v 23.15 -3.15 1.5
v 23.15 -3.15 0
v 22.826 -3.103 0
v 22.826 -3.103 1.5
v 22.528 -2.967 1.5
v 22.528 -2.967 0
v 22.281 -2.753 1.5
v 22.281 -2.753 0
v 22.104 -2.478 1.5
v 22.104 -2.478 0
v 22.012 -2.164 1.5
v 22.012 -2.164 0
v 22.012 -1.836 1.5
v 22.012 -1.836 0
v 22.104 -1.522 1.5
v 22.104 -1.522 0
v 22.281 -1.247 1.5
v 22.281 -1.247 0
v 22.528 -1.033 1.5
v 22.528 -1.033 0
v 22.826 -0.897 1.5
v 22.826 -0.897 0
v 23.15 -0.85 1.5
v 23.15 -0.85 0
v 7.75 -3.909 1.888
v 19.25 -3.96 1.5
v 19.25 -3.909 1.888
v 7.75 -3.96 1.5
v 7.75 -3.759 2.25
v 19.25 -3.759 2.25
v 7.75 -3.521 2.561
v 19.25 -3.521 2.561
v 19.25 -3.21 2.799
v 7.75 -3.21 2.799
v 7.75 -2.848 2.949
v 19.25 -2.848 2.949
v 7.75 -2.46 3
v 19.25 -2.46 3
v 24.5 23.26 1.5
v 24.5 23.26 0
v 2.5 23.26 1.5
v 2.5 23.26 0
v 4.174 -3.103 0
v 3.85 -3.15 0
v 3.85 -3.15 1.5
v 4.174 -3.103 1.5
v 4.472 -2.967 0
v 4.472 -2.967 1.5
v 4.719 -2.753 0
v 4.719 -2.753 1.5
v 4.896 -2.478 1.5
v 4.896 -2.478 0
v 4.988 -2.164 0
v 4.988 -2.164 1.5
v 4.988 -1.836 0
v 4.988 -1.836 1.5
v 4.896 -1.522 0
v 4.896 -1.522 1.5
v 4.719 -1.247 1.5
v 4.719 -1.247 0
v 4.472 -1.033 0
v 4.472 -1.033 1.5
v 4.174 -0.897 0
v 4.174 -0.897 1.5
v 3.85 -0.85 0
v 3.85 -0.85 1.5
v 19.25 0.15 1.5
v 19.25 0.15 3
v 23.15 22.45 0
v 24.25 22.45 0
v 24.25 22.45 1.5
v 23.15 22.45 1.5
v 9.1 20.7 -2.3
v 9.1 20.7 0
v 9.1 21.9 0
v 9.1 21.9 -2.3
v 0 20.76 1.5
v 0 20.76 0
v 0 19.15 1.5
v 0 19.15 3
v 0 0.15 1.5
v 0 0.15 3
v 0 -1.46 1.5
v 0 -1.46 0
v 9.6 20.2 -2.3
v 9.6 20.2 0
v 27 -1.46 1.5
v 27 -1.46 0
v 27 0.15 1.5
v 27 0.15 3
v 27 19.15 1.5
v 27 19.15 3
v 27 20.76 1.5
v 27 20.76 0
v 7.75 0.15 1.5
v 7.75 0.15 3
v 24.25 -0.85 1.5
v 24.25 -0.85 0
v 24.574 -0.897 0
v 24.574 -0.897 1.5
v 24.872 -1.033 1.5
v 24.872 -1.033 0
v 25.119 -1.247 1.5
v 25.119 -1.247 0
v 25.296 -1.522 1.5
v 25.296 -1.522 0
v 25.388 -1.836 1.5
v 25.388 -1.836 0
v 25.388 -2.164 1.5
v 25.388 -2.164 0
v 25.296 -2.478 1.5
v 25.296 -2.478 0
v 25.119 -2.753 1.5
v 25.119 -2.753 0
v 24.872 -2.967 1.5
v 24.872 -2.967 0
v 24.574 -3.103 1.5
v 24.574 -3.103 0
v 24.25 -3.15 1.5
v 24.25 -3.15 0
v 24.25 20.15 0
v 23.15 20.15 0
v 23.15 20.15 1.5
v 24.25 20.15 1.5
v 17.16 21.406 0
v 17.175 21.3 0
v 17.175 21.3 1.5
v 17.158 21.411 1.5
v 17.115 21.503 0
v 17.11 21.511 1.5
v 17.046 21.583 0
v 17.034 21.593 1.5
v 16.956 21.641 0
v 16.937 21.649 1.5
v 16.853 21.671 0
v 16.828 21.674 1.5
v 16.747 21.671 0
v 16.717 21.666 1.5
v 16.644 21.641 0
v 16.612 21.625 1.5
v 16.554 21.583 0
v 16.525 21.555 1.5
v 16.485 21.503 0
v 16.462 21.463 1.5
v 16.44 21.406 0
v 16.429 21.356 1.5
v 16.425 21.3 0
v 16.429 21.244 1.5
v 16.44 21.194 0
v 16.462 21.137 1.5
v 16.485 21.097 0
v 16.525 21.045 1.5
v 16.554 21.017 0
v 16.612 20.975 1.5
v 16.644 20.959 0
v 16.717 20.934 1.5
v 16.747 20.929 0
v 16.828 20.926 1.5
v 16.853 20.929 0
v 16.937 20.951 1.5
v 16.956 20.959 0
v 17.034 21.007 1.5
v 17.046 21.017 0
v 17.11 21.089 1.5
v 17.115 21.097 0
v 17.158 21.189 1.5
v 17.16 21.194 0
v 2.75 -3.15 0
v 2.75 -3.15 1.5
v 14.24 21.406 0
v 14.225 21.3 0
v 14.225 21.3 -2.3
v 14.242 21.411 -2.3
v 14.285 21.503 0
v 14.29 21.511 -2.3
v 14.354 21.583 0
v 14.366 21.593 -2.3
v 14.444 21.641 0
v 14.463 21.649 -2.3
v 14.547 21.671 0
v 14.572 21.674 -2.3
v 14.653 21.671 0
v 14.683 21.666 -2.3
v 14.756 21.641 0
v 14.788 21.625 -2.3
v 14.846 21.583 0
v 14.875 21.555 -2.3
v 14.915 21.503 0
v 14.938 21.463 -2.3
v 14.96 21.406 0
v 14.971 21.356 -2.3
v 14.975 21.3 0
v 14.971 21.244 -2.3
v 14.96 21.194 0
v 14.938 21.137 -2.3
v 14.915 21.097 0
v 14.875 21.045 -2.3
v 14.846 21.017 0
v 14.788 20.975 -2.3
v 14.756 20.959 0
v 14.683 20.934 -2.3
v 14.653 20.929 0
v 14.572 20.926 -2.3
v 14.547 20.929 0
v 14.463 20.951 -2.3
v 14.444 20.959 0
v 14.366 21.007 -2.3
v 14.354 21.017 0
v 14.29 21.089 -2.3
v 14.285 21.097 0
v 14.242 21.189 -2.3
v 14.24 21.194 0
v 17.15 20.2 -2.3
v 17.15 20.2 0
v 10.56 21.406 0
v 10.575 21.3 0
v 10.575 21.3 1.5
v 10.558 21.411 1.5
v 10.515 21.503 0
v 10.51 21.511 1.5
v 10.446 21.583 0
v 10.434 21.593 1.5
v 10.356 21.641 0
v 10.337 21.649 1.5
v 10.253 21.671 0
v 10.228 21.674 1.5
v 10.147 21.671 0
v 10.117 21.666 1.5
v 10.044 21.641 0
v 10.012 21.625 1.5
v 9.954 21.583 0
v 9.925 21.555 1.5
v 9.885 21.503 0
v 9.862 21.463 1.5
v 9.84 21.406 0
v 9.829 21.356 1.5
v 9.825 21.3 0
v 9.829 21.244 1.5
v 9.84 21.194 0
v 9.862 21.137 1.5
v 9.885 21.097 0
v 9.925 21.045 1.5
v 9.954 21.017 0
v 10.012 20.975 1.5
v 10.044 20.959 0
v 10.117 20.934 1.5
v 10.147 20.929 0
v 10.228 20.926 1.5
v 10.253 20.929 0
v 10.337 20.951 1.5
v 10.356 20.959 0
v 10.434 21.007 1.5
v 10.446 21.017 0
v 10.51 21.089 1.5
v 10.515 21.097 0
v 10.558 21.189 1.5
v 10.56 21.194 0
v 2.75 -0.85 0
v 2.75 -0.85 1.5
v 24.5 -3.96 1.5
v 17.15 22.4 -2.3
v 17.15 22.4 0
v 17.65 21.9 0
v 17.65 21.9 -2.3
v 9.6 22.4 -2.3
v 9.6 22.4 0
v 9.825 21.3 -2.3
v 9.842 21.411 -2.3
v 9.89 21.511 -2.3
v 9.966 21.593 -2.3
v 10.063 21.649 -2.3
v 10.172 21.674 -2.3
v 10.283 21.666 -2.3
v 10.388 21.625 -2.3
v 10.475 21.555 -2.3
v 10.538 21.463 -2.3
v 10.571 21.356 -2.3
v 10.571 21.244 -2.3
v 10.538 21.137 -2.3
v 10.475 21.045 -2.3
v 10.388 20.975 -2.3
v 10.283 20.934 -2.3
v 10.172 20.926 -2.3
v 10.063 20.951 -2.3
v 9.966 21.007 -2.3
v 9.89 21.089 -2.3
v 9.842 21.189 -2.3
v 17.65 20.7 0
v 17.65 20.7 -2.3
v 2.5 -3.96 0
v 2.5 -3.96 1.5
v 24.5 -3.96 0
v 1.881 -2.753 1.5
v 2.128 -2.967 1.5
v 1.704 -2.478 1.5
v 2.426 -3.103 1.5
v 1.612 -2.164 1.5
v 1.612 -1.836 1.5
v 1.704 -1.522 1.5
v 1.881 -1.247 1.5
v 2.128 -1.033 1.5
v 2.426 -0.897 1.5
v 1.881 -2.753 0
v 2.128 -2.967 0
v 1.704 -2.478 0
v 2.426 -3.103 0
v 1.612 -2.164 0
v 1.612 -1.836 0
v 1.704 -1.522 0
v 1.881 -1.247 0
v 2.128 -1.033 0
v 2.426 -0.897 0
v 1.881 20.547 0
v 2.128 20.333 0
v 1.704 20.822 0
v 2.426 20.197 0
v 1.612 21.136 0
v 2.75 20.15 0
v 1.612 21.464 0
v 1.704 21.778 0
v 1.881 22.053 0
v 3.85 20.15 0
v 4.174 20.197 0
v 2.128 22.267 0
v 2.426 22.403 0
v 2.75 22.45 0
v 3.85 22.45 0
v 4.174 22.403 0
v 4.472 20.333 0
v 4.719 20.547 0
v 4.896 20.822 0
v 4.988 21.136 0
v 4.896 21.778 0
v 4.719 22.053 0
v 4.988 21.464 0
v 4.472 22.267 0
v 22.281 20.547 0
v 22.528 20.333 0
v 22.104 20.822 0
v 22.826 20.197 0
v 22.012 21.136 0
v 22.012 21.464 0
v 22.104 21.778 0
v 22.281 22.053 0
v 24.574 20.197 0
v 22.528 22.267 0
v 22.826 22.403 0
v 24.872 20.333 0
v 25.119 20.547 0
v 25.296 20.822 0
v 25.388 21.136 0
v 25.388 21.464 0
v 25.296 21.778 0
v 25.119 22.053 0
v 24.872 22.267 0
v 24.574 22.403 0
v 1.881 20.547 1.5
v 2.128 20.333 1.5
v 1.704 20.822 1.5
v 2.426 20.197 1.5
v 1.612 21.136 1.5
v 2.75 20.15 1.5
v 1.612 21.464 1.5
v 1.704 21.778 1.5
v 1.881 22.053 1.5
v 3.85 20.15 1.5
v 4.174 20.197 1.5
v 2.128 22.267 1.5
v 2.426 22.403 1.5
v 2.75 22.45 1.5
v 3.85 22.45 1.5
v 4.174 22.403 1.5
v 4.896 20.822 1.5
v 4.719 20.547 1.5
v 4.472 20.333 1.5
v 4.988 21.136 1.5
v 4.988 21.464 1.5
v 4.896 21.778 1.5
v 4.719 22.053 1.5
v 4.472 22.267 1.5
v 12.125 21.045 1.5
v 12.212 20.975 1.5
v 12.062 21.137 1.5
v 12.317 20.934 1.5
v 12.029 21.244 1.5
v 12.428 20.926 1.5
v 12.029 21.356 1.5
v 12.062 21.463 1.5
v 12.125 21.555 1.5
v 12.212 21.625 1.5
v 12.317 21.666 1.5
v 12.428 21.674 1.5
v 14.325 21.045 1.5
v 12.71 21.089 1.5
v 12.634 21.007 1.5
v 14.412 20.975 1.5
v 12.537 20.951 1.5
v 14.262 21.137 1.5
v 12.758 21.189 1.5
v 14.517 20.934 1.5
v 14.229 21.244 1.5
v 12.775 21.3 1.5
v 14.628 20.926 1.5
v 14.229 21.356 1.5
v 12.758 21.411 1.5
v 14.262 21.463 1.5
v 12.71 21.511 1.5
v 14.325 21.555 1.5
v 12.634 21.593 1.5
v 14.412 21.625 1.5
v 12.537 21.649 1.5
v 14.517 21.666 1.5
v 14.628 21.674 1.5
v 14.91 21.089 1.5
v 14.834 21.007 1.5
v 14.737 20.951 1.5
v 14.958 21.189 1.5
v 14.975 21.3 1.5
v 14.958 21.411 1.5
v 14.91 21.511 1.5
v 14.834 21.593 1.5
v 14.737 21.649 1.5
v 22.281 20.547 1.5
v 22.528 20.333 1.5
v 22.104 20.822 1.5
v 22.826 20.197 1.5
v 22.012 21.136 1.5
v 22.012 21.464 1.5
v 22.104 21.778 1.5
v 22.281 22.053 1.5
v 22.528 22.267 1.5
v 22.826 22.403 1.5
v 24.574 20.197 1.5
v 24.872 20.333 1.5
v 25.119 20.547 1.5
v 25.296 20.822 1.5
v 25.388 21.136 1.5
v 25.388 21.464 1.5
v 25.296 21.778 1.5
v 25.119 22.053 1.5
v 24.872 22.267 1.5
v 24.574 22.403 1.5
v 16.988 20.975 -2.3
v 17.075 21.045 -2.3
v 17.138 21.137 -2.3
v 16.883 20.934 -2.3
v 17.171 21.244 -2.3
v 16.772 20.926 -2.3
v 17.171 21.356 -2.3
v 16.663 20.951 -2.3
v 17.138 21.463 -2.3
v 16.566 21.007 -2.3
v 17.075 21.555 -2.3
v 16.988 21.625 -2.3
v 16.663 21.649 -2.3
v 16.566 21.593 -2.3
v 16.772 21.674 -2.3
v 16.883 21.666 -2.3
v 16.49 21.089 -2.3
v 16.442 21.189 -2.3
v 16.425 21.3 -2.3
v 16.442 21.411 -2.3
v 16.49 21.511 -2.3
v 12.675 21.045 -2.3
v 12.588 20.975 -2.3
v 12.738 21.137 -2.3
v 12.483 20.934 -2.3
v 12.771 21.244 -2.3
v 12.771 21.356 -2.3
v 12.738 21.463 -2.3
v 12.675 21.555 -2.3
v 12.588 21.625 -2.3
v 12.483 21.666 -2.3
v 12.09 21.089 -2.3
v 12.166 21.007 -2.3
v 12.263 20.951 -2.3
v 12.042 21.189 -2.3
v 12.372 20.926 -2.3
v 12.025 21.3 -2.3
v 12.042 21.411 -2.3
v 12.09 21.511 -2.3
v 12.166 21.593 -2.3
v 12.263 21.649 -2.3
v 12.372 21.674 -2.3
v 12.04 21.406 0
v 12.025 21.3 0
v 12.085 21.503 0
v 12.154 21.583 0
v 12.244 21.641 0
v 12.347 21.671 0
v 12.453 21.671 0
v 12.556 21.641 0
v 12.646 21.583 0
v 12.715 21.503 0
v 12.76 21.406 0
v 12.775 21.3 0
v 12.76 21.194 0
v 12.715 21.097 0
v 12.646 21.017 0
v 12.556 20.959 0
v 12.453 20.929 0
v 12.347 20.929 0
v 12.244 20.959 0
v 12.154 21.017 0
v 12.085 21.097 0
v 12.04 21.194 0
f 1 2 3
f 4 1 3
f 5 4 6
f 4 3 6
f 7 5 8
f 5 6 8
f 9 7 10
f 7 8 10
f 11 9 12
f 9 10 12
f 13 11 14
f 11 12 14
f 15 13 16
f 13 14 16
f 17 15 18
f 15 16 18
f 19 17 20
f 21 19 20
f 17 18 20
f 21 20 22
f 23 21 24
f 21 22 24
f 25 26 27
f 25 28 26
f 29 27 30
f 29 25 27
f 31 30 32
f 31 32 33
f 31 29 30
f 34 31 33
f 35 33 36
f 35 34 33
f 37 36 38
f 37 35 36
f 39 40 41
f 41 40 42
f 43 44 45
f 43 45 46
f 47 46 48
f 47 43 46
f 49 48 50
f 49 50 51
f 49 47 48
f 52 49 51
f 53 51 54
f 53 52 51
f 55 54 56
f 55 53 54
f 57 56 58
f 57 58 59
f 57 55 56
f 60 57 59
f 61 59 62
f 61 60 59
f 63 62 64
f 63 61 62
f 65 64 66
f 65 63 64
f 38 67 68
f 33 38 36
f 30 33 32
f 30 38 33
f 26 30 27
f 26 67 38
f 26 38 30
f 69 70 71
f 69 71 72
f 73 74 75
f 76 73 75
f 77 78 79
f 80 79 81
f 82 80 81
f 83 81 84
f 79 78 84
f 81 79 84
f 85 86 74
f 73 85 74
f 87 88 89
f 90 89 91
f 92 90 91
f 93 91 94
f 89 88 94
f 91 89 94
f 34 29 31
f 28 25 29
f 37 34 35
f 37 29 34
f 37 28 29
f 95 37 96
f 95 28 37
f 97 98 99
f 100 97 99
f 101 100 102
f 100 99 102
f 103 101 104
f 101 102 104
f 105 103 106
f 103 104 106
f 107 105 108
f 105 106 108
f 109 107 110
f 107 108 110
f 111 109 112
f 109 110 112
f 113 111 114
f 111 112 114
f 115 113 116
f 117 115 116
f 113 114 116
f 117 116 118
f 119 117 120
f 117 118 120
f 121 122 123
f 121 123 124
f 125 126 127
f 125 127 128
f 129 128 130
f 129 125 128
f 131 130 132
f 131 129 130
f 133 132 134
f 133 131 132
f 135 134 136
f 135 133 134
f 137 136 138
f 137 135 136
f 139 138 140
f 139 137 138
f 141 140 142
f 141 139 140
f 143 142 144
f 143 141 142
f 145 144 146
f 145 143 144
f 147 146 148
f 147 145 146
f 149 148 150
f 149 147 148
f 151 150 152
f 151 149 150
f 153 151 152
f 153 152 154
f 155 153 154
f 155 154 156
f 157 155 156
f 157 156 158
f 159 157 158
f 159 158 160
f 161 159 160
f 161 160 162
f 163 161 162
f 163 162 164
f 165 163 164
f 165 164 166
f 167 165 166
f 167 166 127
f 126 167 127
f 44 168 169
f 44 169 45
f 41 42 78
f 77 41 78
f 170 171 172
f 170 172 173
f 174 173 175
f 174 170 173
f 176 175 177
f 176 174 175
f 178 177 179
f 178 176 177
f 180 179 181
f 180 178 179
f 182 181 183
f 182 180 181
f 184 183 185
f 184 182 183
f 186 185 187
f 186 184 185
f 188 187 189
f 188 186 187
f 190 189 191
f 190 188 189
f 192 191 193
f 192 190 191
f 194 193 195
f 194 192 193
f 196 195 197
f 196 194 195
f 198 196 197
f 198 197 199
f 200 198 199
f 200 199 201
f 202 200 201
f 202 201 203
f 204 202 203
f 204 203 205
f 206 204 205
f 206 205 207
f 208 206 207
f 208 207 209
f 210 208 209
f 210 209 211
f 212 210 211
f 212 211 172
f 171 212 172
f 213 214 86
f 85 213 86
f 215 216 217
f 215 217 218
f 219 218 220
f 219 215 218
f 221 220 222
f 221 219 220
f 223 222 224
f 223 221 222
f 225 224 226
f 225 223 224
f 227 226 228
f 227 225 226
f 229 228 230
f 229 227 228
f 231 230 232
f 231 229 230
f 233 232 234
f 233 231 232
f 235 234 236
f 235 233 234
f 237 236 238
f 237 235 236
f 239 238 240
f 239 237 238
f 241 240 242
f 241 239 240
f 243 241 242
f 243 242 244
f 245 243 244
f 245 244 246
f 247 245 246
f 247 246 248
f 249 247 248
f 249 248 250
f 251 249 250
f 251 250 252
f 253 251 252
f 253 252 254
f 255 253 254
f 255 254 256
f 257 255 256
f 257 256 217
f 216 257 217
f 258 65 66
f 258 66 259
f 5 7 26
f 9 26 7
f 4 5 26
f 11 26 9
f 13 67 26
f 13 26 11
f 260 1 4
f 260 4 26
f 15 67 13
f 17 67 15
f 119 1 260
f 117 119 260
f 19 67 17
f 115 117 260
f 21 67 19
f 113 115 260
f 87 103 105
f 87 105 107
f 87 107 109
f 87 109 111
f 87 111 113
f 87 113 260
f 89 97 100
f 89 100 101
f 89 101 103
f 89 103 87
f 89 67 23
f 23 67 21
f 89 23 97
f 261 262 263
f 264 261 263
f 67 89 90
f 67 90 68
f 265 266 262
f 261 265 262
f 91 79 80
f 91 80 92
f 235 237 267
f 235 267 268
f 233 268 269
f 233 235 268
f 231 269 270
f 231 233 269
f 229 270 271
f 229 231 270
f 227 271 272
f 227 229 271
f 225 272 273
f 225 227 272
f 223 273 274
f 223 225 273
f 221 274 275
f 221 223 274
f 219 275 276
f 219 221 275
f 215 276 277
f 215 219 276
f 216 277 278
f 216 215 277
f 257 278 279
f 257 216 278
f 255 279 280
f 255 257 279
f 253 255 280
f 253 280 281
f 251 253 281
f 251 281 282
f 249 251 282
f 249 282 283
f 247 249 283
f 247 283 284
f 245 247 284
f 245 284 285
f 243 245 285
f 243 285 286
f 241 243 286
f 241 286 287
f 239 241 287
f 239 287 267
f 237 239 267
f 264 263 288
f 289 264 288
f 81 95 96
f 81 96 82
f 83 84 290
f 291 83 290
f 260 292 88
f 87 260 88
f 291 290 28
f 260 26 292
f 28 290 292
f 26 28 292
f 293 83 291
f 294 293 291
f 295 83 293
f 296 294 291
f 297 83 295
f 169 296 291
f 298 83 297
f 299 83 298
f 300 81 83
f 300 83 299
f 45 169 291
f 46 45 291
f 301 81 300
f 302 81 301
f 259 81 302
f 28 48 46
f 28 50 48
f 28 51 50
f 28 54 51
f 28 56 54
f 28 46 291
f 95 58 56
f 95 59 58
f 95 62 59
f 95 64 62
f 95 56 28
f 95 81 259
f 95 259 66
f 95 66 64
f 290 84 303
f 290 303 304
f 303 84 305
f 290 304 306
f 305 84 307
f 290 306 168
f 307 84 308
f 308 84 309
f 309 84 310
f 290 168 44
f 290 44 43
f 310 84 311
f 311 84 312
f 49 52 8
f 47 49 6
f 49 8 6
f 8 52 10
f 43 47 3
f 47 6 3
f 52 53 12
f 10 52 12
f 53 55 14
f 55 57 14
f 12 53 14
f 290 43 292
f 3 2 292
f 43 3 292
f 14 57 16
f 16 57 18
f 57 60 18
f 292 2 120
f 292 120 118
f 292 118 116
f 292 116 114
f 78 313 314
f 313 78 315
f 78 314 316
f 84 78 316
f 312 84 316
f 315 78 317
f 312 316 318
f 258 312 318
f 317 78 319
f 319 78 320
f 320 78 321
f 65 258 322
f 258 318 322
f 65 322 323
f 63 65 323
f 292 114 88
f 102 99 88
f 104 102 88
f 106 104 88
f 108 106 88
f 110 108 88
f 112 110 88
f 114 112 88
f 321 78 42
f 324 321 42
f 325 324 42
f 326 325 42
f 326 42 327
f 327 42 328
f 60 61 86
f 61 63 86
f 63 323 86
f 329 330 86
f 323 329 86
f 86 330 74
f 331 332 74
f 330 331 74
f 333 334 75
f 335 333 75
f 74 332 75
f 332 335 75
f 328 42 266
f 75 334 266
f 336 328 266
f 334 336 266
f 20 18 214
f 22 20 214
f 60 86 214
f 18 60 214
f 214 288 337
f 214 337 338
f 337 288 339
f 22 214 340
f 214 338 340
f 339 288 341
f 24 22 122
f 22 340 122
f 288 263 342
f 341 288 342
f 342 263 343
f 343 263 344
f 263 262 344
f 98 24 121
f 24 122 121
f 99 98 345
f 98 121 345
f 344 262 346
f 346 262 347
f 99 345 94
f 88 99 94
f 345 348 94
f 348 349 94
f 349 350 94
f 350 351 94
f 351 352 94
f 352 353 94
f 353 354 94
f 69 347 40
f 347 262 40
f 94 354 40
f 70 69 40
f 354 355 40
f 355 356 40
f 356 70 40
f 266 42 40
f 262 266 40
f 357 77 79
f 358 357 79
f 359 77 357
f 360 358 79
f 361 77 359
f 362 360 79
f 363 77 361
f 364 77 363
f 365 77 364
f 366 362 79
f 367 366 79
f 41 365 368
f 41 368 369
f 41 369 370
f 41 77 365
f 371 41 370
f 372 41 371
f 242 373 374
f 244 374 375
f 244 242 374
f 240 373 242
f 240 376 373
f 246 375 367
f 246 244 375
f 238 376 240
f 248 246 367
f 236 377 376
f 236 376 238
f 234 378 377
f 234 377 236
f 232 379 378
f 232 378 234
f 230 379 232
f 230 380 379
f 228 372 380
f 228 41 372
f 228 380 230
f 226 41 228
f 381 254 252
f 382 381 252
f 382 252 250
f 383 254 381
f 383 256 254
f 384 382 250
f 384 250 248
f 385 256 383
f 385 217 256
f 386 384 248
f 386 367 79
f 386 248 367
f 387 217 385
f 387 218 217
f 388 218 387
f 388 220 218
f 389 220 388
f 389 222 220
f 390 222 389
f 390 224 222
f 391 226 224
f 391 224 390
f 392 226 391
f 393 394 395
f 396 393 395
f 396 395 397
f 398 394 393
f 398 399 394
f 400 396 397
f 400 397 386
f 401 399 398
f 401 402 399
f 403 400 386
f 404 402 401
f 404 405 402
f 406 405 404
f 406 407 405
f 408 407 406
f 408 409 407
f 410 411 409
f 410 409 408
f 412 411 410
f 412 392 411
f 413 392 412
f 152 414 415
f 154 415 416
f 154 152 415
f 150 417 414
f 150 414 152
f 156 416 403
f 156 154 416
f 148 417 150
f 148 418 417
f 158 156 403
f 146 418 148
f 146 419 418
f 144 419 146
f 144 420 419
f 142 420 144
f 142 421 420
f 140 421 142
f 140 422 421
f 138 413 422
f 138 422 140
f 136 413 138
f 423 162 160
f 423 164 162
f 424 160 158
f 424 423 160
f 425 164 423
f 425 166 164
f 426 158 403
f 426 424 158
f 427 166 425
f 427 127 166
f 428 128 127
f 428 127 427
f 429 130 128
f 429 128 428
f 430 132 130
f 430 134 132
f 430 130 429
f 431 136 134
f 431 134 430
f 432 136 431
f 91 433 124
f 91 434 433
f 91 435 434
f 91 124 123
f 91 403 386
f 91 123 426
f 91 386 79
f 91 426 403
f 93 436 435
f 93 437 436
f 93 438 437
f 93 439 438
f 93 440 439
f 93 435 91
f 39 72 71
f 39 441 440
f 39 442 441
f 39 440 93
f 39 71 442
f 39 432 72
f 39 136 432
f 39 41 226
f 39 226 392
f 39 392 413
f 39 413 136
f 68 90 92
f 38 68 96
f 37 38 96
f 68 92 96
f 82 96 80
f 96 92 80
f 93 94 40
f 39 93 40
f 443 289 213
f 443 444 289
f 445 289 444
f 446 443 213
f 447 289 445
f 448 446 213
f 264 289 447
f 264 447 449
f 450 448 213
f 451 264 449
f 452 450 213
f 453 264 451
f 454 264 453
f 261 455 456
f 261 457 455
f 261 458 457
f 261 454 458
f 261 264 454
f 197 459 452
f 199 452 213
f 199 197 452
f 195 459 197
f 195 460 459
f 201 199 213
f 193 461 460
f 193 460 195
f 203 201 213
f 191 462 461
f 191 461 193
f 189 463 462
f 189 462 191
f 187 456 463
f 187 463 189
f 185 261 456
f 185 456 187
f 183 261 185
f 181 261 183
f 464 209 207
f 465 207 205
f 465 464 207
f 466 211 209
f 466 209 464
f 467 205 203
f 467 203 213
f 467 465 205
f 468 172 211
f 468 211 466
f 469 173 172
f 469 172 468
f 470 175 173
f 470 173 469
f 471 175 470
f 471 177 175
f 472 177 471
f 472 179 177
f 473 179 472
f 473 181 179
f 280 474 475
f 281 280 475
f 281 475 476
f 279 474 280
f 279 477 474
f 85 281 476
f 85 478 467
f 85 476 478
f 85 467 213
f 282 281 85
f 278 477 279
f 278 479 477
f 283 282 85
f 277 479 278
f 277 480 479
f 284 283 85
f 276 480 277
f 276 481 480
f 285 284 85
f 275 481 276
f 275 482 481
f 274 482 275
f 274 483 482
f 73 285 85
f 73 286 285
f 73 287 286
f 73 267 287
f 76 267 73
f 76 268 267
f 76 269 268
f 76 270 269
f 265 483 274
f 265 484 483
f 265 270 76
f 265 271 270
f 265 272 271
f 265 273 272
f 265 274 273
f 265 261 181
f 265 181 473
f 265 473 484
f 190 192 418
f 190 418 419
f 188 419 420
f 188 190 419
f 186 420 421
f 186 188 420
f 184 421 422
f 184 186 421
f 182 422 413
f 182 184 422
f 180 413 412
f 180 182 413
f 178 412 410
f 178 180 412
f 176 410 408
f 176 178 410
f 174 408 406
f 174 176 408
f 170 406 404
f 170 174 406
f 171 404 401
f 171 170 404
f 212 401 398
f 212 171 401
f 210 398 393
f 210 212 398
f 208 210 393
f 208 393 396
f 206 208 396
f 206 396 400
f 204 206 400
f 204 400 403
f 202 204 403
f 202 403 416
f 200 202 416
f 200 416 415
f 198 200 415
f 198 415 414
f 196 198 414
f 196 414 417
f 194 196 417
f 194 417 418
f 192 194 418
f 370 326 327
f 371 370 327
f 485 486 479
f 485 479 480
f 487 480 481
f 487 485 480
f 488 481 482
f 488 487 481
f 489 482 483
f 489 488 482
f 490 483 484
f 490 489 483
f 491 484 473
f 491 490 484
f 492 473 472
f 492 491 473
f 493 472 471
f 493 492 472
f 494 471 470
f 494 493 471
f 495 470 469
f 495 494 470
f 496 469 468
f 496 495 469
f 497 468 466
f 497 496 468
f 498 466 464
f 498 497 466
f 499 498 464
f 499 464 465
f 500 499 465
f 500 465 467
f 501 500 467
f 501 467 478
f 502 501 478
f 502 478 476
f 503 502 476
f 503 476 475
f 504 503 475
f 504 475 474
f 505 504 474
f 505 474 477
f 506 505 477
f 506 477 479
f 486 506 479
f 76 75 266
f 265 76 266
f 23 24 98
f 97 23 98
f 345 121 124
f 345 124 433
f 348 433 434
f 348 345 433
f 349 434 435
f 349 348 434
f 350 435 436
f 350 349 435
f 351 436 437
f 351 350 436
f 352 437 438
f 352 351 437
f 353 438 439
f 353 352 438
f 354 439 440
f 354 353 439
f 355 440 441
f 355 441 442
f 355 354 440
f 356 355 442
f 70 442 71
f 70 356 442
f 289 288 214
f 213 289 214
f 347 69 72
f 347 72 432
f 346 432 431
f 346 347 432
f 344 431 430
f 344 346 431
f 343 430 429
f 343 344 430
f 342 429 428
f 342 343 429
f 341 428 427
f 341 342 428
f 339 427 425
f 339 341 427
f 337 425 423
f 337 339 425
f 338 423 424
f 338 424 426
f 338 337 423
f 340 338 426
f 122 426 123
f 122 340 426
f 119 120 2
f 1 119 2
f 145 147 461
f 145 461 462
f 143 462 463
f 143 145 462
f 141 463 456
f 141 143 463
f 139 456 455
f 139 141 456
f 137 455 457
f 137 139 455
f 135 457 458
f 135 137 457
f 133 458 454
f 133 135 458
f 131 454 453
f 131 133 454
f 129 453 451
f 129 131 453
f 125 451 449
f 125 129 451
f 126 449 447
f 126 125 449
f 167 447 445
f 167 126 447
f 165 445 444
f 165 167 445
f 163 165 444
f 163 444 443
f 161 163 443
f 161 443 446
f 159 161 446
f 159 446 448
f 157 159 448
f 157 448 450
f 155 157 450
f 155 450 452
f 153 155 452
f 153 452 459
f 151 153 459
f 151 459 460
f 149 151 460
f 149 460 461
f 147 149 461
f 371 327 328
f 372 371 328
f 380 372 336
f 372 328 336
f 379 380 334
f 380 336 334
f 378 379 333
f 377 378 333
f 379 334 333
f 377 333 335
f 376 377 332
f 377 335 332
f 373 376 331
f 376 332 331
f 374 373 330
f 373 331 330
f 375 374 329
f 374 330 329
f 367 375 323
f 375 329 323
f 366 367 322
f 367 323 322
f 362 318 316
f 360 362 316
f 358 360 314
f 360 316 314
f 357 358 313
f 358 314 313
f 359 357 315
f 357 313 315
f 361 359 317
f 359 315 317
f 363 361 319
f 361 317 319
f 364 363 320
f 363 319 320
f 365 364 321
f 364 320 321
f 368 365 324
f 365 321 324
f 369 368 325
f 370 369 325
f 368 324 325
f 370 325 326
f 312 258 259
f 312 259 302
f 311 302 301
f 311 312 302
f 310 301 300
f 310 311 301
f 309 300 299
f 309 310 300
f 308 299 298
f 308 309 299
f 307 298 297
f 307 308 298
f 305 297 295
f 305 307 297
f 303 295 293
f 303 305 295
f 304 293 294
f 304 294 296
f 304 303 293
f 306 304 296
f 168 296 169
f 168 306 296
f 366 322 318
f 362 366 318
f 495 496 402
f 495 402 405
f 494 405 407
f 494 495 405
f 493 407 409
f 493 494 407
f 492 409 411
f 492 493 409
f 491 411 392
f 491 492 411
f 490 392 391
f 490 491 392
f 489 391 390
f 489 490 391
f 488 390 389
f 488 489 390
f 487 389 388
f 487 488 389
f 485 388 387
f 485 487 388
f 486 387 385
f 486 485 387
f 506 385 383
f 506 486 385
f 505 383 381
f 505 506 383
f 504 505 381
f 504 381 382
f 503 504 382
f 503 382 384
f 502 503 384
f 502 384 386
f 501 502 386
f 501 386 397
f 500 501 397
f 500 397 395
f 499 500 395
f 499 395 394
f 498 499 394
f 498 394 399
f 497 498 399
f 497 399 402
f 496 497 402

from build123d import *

# Parameters (mm, degrees)
ESQUISSE1_R        = 0.375
BOSS_EXTRU_1_DEPTH = 1.5
BOSS_EXTRU_2_DEPTH = 1.5
CONG_1_R           = 1.5
ESQUISSE3_R        = 0.375
BOSS_EXTRU_3_DEPTH = 2.3


with BuildPart() as part:
    # Esquisse1 → Boss.-Extru.1 (new body)
    with BuildSketch(Plane.XY):
        Polygon((0, -1.46), (2.5, -3.96), (24.5, -3.96), (27, -1.46), (27, 20.76), (24.5, 23.26), (2.5, 23.26), (0, 20.76), align=None)
        with Locations((10.2, 21.3)):
            Circle(ESQUISSE1_R, mode=Mode.SUBTRACT)
        with Locations((12.4, 21.3)):
            Circle(ESQUISSE1_R, mode=Mode.SUBTRACT)
        with Locations((14.6, 21.3)):
            Circle(ESQUISSE1_R, mode=Mode.SUBTRACT)
        with Locations((16.8, 21.3)):
            Circle(ESQUISSE1_R, mode=Mode.SUBTRACT)
        with BuildLine():
            Line((2.75, 22.45), (3.85, 22.45))
            ThreePointArc((3.85, 22.45), (5, 21.3), (3.85, 20.15))
            Line((3.85, 20.15), (2.75, 20.15))
            ThreePointArc((2.75, 20.15), (1.6, 21.3), (2.75, 22.45))
        make_face(mode=Mode.SUBTRACT)
        with BuildLine():
            Line((24.25, 22.45), (23.15, 22.45))
            ThreePointArc((23.15, 22.45), (22, 21.3), (23.15, 20.15))
            Line((23.15, 20.15), (24.25, 20.15))
            ThreePointArc((24.25, 20.15), (25.4, 21.3), (24.25, 22.45))
        make_face(mode=Mode.SUBTRACT)
        with BuildLine():
            Line((24.25, -3.15), (23.15, -3.15))
            ThreePointArc((23.15, -3.15), (22, -2), (23.15, -0.85))
            Line((23.15, -0.85), (24.25, -0.85))
            ThreePointArc((24.25, -0.85), (25.4, -2), (24.25, -3.15))
        make_face(mode=Mode.SUBTRACT)
        with BuildLine():
            Line((2.75, -3.15), (3.85, -3.15))
            ThreePointArc((3.85, -3.15), (5, -2), (3.85, -0.85))
            Line((3.85, -0.85), (2.75, -0.85))
            ThreePointArc((2.75, -0.85), (1.6, -2), (2.75, -3.15))
        make_face(mode=Mode.SUBTRACT)
    extrude(amount=BOSS_EXTRU_1_DEPTH)

    # Esquisse2 → Boss.-Extru.2 (add)
    with BuildSketch(Plane.XY.offset(1.5)):
        Polygon((0, 19.15), (27, 19.15), (27, 0.15), (19.25, 0.15), (19.25, -3.96), (7.75, -3.96), (7.75, 0.15), (0, 0.15), align=None)
    extrude(amount=BOSS_EXTRU_2_DEPTH)

    # Congé1
    cong_1_edges = [part.edges().sort_by_distance(p)[0] for p in [
        (13.5, -3.96, 3),
    ]]
    fillet(cong_1_edges, radius=CONG_1_R)

    # Esquisse3 → Boss.-Extru.3 (add)
    with BuildSketch(Plane(origin=(0, 0, 0), x_dir=(-1, 0, 0), z_dir=(0, 0, -1))):
        Polygon((-17.65, 20.7), (-17.15, 20.2), (-15.45, 20.2), (-13.5, 20.2), (-11.3, 20.2), (-9.6, 20.2), (-9.1, 20.7), (-9.1, 21.9), (-9.6, 22.4), (-11.3, 22.4), (-13.5, 22.4), (-15.45, 22.4), (-17.15, 22.4), (-17.65, 21.9), align=None)
        with Locations((-10.2, 21.3)):
            Circle(ESQUISSE3_R, mode=Mode.SUBTRACT)
        with Locations((-16.8, 21.3)):
            Circle(ESQUISSE3_R, mode=Mode.SUBTRACT)
        with Locations((-12.4, 21.3)):
            Circle(ESQUISSE3_R, mode=Mode.SUBTRACT)
        with Locations((-14.6, 21.3)):
            Circle(ESQUISSE3_R, mode=Mode.SUBTRACT)
    extrude(amount=BOSS_EXTRU_3_DEPTH)


solid = part.part
